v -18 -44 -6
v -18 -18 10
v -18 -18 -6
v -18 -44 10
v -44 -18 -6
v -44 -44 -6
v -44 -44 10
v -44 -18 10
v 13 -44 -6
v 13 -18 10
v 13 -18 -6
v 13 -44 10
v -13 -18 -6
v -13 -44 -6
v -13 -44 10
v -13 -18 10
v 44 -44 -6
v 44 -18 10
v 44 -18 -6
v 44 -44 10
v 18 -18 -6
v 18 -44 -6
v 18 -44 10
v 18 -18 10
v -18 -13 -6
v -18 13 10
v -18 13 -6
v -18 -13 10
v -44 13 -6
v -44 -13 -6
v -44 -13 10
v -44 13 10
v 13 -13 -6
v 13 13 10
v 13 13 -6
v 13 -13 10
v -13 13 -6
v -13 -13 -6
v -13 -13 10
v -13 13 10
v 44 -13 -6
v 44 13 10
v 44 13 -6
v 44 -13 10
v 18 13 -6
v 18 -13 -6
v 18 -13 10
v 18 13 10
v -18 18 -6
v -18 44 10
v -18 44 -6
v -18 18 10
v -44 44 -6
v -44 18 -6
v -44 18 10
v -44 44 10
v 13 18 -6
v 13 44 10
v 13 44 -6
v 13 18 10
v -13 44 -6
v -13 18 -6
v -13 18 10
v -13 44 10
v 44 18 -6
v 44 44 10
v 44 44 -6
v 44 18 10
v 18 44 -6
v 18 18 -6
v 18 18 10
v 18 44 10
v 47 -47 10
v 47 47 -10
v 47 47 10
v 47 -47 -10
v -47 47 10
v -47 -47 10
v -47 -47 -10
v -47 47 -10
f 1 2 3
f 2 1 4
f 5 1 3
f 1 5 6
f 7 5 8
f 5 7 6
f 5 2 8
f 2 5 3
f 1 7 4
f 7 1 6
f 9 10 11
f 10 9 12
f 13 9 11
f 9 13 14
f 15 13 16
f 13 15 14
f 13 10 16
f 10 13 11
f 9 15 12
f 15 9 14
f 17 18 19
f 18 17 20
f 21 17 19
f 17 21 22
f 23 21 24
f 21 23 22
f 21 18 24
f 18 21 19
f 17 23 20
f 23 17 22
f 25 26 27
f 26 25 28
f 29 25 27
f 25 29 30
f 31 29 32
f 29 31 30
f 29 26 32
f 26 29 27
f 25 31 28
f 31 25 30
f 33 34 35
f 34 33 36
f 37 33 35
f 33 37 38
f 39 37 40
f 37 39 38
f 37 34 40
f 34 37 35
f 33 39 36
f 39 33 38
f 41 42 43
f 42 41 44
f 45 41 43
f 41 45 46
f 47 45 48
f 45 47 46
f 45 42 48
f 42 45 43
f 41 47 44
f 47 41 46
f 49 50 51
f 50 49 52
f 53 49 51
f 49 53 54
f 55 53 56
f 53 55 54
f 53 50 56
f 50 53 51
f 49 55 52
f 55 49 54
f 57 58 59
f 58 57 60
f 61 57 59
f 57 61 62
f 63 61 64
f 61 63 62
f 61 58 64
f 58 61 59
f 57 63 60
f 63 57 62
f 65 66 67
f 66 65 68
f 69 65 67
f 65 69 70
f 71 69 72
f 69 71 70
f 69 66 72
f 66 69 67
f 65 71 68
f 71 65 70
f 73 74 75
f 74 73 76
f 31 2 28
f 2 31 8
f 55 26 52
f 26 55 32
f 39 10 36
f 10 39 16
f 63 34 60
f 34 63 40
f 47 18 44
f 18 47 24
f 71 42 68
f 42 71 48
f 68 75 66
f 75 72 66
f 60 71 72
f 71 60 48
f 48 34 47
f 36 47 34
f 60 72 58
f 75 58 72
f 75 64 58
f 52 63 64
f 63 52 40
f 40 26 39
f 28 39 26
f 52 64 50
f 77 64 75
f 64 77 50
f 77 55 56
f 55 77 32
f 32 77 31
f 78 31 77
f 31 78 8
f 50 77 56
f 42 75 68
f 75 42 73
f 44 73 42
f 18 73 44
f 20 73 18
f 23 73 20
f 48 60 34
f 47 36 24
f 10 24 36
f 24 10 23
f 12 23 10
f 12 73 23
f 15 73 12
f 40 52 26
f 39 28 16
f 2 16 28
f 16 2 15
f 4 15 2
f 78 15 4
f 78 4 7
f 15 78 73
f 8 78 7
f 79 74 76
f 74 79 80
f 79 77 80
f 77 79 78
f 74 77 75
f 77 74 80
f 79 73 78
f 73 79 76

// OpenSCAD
$fn = 32;

// ----------------------------------------------------------------------
// Pocket plate 94 x 94 x 20
// 3 x 3 pockets 26 mm square, 16 mm deep
// ----------------------------------------------------------------------

// --- parameters (mm) ---
thickness = 20;  // plate thickness
floor_t = 4;     // material left under each pocket
pocket = 26;     // pocket side length
pitch_x = 31;    // pocket pitch along X
pitch_y = 31;    // pocket pitch along Y
cols = 3;        // pockets per row
rows = 3;        // rows of pockets

// --- derived feature positions (mm) ---
depth = thickness - floor_t;        // = 16   pocket depth, down to the floor
span_x = (cols - 1) * pitch_x;      // = 62   distance between outer pockets
span_y = (rows - 1) * pitch_y;      // = 62   distance between outer pocket rows
origin_x = -span_x / 2;             // = -31   X of the first pocket
origin_y = -span_y / 2;             // = -31   Y of the first pocket
plate = [span_x + pocket + 6, span_y + pocket + 6, thickness];  // = [94, 94, 20]   overall size: pockets plus 3 mm of wall on each side
feature_centers = [
  [origin_x + 0 * pitch_x, origin_y + 0 * pitch_y],
  [origin_x + 1 * pitch_x, origin_y + 0 * pitch_y],
  [origin_x + 2 * pitch_x, origin_y + 0 * pitch_y],
  [origin_x + 0 * pitch_x, origin_y + 1 * pitch_y],
  [origin_x + 1 * pitch_x, origin_y + 1 * pitch_y],
  [origin_x + 2 * pitch_x, origin_y + 1 * pitch_y],
  [origin_x + 0 * pitch_x, origin_y + 2 * pitch_y],
  [origin_x + 1 * pitch_x, origin_y + 2 * pitch_y],
  [origin_x + 2 * pitch_x, origin_y + 2 * pitch_y]
];   // pocket centres, used verbatim by the cutter loop

// plate outline, then one pocket per centre in feature_centers
difference() {
  cube(plate, center = true);
  for (centre = feature_centers)
    translate([centre[0] - pocket / 2, centre[1] - pocket / 2, plate[2] / 2 - depth])
      cube([pocket, pocket, depth + 1]);  // centred on the declared pocket centre
}
